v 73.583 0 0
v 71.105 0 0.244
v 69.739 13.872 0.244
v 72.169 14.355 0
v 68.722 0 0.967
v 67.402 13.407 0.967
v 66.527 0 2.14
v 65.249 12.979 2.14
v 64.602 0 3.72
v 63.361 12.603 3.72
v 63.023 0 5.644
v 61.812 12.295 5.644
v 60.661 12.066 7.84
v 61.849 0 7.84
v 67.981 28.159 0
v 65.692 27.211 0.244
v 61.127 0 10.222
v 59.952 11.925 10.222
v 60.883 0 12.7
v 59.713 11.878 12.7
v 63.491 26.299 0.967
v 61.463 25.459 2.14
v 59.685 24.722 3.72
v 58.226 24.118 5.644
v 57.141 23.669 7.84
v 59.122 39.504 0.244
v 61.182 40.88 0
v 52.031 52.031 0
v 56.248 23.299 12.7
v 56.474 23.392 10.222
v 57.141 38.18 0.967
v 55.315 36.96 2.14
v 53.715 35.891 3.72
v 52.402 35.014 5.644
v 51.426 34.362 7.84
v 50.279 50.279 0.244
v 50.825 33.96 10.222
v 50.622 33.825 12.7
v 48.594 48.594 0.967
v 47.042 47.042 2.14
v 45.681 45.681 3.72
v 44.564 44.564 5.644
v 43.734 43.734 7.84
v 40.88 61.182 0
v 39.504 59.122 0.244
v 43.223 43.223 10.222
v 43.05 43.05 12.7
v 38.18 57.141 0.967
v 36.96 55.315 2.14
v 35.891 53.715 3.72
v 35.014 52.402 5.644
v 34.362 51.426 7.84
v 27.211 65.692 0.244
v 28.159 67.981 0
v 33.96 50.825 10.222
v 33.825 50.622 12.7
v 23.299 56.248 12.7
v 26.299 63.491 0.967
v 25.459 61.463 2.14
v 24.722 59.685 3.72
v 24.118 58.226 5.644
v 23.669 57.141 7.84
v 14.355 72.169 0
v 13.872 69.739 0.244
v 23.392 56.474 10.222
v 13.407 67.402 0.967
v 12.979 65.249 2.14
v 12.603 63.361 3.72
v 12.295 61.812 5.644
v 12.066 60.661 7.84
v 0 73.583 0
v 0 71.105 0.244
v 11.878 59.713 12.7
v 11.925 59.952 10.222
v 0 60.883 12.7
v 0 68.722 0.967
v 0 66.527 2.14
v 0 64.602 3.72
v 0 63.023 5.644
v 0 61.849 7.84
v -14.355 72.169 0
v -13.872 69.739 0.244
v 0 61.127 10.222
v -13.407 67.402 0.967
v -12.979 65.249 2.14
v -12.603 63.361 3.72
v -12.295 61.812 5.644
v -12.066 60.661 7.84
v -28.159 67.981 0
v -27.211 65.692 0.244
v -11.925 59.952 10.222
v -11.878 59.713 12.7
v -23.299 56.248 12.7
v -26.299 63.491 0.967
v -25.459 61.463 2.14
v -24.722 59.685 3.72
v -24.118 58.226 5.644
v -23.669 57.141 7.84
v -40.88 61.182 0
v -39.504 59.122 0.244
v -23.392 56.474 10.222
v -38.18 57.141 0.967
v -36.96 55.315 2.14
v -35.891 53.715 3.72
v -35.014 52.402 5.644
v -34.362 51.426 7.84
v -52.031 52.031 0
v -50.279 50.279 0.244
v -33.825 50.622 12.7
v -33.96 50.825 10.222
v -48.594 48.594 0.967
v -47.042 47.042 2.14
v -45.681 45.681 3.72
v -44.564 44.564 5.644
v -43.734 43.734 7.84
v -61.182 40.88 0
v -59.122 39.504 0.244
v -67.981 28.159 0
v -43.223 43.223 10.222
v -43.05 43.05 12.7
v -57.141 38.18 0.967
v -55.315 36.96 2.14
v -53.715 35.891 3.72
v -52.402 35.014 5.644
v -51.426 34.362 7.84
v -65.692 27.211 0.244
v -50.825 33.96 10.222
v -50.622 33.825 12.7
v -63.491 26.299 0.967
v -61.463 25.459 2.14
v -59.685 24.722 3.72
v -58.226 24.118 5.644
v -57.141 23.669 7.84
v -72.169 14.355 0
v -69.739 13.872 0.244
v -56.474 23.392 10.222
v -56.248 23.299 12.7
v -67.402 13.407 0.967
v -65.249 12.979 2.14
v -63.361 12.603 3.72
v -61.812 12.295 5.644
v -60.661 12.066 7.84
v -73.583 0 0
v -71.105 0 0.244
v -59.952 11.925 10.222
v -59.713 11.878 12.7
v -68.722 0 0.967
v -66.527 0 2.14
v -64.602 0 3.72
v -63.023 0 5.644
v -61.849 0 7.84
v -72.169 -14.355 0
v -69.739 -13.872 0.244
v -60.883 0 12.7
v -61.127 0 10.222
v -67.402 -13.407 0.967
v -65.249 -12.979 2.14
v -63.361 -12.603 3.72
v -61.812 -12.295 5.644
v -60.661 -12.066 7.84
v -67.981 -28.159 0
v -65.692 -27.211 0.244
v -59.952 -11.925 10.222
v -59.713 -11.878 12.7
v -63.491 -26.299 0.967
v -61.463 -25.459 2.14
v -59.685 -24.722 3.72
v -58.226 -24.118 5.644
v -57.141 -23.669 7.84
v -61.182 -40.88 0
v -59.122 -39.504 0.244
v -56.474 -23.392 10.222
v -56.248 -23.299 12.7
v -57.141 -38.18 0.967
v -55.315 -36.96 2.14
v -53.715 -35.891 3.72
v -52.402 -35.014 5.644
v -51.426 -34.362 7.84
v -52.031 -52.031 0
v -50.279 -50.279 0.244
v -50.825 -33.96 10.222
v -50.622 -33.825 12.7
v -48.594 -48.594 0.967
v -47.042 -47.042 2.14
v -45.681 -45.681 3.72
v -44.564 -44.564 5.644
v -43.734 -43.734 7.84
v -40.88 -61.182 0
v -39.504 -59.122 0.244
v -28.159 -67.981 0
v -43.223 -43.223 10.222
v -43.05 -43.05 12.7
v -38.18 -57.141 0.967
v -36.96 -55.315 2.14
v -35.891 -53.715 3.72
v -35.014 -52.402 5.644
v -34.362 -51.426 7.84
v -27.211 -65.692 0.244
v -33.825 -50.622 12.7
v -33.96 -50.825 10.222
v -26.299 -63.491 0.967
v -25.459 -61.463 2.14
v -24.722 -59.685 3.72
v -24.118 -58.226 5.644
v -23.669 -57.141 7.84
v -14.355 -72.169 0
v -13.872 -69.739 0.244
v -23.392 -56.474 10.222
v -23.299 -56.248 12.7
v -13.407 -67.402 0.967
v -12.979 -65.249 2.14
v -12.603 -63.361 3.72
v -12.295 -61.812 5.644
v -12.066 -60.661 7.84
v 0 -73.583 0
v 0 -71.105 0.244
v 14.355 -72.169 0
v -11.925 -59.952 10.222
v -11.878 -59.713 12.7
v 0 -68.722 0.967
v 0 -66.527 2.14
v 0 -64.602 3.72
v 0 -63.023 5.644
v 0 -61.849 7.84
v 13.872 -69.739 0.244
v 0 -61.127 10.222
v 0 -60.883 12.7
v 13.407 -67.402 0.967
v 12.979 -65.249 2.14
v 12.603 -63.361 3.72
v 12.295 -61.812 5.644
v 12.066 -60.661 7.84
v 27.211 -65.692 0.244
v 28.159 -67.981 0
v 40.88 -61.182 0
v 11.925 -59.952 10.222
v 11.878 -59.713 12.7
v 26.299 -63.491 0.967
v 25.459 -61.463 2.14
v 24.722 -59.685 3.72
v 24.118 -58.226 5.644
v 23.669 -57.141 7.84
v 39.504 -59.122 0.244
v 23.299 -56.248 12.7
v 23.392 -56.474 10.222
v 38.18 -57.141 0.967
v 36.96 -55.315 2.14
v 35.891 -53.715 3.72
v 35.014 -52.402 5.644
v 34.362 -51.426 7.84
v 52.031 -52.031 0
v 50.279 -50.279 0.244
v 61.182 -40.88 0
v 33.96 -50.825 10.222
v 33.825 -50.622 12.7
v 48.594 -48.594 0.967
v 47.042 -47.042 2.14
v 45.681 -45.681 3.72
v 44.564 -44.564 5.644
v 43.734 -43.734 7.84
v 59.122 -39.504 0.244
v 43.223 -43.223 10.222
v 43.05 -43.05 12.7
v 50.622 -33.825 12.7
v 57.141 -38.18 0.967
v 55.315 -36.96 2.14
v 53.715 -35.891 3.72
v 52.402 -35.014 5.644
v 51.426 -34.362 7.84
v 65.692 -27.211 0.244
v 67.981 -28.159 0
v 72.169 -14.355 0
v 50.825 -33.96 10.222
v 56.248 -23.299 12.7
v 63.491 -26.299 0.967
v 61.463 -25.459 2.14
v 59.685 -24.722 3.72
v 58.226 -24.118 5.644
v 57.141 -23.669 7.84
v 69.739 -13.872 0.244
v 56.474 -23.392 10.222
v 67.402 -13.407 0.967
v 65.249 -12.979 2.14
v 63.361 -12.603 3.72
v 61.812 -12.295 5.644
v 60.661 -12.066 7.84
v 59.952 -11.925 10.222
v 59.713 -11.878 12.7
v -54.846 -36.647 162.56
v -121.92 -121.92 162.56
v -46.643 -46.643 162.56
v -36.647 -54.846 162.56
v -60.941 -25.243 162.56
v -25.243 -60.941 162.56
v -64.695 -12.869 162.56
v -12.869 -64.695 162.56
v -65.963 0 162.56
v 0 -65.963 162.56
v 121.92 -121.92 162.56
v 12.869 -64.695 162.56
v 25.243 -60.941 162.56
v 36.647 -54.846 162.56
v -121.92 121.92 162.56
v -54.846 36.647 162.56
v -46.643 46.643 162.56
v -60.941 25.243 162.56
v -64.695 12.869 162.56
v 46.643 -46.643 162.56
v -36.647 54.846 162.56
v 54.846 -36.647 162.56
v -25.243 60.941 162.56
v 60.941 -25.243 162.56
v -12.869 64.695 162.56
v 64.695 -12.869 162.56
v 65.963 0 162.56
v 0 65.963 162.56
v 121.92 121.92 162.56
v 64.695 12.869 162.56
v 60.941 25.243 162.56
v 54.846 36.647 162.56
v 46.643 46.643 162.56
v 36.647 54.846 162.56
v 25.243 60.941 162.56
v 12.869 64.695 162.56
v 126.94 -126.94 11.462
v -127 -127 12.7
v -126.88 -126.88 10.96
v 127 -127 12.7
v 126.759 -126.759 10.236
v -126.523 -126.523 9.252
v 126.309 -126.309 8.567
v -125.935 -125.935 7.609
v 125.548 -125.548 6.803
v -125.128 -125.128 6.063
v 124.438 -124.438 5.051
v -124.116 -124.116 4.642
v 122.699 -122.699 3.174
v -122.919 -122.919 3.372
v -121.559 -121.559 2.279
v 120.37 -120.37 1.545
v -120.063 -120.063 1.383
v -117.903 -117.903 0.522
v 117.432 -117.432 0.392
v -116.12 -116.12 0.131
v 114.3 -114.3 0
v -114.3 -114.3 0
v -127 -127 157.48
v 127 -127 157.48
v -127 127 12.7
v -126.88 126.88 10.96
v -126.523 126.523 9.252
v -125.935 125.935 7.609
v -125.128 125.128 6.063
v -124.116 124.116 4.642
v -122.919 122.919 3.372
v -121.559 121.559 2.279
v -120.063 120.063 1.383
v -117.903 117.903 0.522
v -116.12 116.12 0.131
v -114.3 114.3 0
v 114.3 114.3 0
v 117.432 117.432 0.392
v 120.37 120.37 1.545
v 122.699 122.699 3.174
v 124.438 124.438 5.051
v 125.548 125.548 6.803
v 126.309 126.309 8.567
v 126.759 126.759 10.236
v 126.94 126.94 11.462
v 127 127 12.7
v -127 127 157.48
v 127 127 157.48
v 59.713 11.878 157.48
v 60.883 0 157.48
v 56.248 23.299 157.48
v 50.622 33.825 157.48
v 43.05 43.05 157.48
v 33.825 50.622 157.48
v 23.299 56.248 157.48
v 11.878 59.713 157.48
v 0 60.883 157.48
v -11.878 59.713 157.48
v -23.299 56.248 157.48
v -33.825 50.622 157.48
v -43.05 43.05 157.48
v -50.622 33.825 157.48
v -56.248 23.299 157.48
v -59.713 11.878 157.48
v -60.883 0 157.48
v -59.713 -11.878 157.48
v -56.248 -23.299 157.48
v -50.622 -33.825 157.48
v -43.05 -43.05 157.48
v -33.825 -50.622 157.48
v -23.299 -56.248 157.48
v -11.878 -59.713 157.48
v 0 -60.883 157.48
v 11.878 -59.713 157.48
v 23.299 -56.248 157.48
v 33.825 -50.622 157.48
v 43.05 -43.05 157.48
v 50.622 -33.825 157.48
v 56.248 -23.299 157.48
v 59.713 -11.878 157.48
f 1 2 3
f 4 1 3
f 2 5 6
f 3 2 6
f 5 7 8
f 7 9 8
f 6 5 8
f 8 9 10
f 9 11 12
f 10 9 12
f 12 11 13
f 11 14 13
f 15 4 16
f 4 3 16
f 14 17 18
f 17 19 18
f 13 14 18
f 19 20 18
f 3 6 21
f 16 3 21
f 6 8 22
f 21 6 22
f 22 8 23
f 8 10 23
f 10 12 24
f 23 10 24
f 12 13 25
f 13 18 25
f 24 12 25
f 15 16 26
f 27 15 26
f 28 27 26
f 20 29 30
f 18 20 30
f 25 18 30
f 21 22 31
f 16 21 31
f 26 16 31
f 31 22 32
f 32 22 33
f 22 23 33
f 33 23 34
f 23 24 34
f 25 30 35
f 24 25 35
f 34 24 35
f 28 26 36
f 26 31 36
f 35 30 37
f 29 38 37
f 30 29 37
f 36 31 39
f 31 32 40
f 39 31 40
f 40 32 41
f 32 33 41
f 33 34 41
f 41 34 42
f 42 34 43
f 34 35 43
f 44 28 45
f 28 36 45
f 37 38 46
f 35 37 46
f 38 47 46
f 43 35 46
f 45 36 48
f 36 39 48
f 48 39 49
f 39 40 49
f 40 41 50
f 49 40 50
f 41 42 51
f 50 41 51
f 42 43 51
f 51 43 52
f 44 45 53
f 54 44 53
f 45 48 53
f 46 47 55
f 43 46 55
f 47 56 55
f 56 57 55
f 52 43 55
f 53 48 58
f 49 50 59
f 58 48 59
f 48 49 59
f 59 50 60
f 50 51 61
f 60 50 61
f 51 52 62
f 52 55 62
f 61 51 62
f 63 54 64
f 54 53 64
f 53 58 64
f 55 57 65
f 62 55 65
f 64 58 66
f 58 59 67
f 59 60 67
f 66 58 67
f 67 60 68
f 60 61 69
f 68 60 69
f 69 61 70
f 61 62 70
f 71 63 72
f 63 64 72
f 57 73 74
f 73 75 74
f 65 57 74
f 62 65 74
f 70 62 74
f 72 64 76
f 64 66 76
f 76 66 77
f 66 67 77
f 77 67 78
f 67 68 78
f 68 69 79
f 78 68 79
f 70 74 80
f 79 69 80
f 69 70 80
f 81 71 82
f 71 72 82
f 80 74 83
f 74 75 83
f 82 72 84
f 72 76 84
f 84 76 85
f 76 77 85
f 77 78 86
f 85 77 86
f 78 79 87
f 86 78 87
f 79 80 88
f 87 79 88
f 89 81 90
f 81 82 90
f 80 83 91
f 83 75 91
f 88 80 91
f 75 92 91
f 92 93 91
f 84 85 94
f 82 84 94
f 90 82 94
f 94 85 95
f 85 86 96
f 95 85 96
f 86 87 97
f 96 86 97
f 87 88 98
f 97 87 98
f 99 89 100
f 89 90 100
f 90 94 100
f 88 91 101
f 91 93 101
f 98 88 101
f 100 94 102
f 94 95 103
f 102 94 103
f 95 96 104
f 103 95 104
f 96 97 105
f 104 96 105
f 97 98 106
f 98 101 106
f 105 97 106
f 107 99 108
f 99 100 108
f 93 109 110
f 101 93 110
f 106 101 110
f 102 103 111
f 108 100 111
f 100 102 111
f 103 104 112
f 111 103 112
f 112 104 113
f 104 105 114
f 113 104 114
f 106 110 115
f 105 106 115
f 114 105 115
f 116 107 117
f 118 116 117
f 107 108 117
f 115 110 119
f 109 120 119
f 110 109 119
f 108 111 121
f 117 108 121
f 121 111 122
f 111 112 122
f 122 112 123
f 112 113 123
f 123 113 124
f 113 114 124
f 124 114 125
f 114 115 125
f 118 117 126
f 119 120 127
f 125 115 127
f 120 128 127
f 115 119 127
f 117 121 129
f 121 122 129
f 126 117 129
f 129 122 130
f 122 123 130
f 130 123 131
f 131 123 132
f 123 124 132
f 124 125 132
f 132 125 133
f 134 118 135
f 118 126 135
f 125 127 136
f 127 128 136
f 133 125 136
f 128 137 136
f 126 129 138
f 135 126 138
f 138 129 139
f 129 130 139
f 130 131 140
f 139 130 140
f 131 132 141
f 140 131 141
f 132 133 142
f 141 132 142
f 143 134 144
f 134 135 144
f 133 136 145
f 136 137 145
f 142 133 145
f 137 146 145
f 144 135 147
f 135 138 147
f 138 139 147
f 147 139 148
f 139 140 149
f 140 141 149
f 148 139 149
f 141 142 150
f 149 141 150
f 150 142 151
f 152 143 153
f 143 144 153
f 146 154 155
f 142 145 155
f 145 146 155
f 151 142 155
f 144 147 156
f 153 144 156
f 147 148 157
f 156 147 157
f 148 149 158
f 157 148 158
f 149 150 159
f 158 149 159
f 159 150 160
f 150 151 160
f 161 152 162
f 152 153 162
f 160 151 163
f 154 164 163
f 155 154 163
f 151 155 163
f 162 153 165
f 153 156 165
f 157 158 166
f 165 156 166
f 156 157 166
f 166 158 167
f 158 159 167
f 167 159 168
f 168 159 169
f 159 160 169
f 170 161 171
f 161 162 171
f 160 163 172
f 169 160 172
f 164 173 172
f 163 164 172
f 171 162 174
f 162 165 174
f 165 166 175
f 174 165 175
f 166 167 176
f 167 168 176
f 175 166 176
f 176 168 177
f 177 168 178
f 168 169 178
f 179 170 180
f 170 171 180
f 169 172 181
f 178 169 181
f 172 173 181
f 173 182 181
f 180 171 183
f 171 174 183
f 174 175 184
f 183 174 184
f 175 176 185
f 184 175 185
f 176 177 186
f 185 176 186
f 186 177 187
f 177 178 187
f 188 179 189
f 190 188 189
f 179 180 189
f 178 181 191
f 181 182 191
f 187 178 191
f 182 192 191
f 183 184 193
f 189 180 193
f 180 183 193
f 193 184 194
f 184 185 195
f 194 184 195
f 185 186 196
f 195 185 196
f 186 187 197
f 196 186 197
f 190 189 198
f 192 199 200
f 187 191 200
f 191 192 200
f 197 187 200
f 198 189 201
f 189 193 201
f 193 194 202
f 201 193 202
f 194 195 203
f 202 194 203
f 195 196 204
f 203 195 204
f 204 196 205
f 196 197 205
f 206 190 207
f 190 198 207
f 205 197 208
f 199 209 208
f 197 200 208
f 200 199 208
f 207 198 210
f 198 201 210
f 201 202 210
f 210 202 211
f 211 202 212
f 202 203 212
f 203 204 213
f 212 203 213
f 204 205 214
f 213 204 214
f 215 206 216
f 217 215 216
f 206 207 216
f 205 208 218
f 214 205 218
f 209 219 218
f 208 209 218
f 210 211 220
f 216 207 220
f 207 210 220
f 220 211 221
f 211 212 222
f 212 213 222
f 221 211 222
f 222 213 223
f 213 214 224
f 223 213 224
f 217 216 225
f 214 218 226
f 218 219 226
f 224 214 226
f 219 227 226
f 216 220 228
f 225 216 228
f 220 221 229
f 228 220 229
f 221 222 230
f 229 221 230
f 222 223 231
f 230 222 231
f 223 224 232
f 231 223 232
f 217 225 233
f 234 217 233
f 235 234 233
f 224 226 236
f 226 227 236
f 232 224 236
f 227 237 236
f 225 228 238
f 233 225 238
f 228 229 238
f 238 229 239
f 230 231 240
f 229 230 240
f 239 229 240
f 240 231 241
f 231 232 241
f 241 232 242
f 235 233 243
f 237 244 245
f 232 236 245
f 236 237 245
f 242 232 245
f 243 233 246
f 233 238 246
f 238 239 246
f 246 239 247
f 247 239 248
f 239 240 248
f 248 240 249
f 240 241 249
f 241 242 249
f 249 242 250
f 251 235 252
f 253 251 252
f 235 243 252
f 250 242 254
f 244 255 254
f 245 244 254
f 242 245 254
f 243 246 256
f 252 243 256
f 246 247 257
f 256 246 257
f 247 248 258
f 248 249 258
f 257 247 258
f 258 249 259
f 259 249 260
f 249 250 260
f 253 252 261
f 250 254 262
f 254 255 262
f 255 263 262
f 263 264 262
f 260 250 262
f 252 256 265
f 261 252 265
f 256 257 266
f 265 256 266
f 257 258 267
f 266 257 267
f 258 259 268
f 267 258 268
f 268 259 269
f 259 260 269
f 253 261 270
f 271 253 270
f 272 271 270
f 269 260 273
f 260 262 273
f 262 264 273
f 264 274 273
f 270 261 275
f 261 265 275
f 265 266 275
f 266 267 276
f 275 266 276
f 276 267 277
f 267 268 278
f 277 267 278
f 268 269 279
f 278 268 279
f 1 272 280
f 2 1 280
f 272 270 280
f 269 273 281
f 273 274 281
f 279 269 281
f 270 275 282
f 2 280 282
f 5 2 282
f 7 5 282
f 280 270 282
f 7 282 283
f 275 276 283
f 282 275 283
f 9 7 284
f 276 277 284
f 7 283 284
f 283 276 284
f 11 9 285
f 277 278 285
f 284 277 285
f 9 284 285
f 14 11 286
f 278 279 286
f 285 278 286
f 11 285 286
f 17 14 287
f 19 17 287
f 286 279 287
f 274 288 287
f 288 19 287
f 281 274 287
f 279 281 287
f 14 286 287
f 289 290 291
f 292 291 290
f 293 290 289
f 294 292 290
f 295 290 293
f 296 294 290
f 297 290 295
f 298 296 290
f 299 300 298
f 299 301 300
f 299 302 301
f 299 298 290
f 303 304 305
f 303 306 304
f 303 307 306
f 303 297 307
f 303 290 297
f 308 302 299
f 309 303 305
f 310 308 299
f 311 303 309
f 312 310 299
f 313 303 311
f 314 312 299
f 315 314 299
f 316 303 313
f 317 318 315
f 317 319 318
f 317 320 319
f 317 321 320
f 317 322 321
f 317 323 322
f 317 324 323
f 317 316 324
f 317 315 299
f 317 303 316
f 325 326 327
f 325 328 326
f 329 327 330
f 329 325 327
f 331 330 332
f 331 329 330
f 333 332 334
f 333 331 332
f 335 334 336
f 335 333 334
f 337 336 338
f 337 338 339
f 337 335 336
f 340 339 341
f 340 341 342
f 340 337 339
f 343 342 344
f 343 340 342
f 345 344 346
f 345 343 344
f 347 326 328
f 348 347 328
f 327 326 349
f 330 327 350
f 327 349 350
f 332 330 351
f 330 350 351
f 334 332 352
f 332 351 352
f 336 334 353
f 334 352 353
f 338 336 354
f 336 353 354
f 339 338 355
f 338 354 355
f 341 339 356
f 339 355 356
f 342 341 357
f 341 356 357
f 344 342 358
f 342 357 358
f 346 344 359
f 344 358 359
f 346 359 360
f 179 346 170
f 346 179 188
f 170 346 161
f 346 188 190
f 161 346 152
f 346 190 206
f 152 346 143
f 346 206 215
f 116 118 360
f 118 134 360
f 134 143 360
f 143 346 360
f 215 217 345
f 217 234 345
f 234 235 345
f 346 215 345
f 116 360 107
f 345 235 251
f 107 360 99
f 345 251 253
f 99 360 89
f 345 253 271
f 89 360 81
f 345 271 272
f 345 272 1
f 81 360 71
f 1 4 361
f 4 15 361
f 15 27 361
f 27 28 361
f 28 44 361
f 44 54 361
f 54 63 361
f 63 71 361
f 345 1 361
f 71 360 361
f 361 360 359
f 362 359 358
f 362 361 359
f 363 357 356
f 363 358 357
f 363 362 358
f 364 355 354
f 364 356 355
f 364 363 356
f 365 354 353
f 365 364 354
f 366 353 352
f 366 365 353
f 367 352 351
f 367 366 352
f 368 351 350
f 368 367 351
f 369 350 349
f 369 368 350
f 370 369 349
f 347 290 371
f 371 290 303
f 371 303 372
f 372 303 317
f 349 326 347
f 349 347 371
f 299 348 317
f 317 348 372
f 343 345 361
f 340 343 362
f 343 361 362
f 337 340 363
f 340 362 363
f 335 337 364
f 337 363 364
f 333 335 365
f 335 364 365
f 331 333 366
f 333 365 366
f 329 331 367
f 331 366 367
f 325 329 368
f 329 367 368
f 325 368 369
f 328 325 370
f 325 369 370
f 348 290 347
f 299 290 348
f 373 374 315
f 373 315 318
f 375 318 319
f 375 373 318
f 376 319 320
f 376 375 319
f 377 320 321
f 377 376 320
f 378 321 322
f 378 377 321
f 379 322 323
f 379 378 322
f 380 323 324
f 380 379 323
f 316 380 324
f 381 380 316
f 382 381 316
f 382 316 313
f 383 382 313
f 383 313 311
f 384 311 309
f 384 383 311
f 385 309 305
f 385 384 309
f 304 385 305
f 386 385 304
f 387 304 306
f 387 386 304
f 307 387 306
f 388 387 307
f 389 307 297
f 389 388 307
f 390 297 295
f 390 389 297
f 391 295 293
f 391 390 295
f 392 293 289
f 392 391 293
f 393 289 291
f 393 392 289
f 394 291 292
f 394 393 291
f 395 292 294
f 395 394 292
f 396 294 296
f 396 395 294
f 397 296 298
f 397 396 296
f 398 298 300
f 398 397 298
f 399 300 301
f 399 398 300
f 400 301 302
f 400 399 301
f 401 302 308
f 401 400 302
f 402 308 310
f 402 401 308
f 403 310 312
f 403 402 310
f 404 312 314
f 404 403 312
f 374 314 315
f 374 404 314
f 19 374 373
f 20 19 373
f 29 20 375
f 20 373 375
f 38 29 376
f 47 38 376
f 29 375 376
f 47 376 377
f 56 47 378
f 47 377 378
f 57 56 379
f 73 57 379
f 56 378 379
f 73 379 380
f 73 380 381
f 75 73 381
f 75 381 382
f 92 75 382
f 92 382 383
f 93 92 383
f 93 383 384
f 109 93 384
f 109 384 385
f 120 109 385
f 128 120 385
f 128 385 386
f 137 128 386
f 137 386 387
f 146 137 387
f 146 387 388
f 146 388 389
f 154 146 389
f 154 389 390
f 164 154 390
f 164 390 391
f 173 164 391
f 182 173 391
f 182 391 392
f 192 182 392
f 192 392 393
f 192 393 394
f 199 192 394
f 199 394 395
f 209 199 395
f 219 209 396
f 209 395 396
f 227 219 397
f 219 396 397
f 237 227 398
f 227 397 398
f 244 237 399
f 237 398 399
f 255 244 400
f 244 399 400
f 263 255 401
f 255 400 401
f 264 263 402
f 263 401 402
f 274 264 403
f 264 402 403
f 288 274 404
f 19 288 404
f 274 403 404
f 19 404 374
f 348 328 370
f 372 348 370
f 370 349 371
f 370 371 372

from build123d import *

# Parameters (mm, degrees)
F0_W     = 254
F0_H     = 254
F1_DEPTH = 162.56
F2_R     = 60.882574
F3_DEPTH = 289.56
F4_SIZE  = 5.08
F5_R     = 12.7
F6_R     = 12.7


with BuildPart() as f1:
    # F0 (on Top) → F1 (new body)
    with BuildSketch(Plane.XY):
        Rectangle(F0_W, F0_H)
    extrude(amount=F1_DEPTH)

    # F2 (on face) → F3 (cut)
    with BuildSketch(Plane.XY.offset(162.56)):
        Circle(F2_R)
    extrude(amount=-F3_DEPTH, mode=Mode.SUBTRACT)

    # F4
    f4_edges = [f1.edges().sort_by_distance(p)[0] for p in [
        (127, 0, 162.56),
        (0, -127, 162.56),
        (-127, 0, 162.56),
        (0, 127, 162.56),
        (-60.882574, 0, 162.56),
    ]]
    chamfer(f4_edges, length=F4_SIZE)

    # F5
    f5_edges = [f1.edges().sort_by_distance(p)[0] for p in [
        (-127, 0, 0),
        (0, 127, 0),
        (127, 0, 0),
        (0, -127, 0),
    ]]
    fillet(f5_edges, radius=F5_R)

    # F6
    f6_edges = [f1.edges().sort_by_distance(p)[0] for p in [
        (-60.882574, 0, 0),
    ]]
    fillet(f6_edges, radius=F6_R)


solid = f1.part
